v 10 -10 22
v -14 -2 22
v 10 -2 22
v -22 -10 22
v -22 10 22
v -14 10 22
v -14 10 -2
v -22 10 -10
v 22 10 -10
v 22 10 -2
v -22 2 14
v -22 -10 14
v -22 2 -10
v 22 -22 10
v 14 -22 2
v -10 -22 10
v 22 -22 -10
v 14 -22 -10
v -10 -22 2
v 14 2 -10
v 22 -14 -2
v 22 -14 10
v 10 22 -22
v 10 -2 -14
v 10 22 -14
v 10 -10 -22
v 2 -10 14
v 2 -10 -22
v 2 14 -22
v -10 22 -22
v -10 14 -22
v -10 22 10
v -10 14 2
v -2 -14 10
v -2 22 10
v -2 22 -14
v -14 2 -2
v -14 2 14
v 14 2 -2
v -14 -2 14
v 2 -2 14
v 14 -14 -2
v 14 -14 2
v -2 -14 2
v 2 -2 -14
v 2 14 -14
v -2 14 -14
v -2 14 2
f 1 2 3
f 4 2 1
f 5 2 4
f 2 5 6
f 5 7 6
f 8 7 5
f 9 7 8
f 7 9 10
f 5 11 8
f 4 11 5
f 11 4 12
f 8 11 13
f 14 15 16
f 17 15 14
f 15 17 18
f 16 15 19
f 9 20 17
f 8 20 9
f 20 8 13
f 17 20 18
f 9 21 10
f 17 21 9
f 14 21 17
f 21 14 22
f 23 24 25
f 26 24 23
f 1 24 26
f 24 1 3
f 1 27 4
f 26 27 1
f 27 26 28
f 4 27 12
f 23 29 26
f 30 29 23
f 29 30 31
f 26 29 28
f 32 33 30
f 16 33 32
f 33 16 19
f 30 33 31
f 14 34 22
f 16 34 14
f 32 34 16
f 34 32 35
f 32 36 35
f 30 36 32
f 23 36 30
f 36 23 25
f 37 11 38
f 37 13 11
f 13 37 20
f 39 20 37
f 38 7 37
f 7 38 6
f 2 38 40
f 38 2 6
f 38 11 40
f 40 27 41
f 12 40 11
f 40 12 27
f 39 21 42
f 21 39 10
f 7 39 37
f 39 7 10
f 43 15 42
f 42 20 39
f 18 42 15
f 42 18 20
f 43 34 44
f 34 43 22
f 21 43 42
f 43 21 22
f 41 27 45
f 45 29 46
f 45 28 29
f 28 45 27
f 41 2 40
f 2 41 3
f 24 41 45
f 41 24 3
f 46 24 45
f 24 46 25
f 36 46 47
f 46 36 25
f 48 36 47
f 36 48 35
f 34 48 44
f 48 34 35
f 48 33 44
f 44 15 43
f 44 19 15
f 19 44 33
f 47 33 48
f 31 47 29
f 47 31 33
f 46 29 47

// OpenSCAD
// Regular Hexagonal Toroid with 24 faces
//   coords via: http://dmccooey.com/polyhedra/RegularHexagonalToroid24.html
//
scaling_factor = 2;

vertices = [
  [-11,   5,  11], [-11,  -5,  11], [ 11, -11,   5], [ 11, -11,  -5],
  [  5,  11, -11], [ -5,  11, -11], [ -7,   5,  11], [ 11,  -7,   5],
  [  5,  11,  -7], [ -5,   7, -11], [-11,  -5,   7], [  7, -11,  -5],
  [ -7,  -1,  11], [ 11,  -7,  -1], [ -1,  11,  -7], [  1,   7, -11],
  [-11,   1,   7], [  7, -11,   1], [  5,  -5,  11], [  5,  -5, -11],
  [ 11,   5,  -5], [-11,   5,  -5], [ -5,  11,   5], [ -5, -11,   5],
  [  5,  -1,  11], [ 11,   5,  -1], [ -1,  11,   5], [  1,  -5, -11],
  [-11,   1,  -5], [ -5, -11,   1], [ -7,   1,   7], [ -7,  -1,   7],
  [  7,  -7,   1], [  7,  -7,  -1], [  1,   7,  -7], [ -1,   7,  -7],
  [  5,  -1,  -7], [ -7,   5,  -1], [ -1,  -7,   5], [  1,  -5,   7],
  [  7,   1,  -5], [ -5,   7,   1], [  1,  -1,   7], [  1,  -1,  -7],
  [  7,   1,  -1], [ -7,   1,  -1], [ -1,   7,   1], [ -1,  -7,   1]
];

faces = [
  [ 0,  1, 18, 24, 12,  6], [ 0,  6, 37, 25, 20, 21], [ 0, 21, 28, 16, 10,  1],
  [ 3,  2, 23, 29, 17, 11], [ 3, 11, 40, 28, 21, 20], [ 3, 20, 25, 13,  7,  2],
  [19,  4,  8, 36, 24, 18], [19, 18,  1, 10, 39, 27], [19, 27, 15,  9,  5,  4],
  [22,  5,  9, 41, 29, 23], [22, 23,  2,  7, 38, 26], [22, 26, 14,  8,  4,  5],
  [30, 16, 28, 40, 44, 45], [30, 45, 37,  6, 12, 31], [30, 31, 42, 39, 10, 16],
  [33, 13, 25, 37, 45, 44], [33, 44, 40, 11, 17, 32], [33, 32, 47, 38,  7, 13],
  [43, 34, 15, 27, 39, 42], [43, 42, 31, 12, 24, 36], [43, 36,  8, 14, 35, 34],
  [46, 35, 14, 26, 38, 47], [46, 47, 32, 17, 29, 41], [46, 41,  9, 15, 34, 35]
];

scale(scaling_factor) {
  polyhedron(points=vertices, faces=faces, convexity=20);
}
